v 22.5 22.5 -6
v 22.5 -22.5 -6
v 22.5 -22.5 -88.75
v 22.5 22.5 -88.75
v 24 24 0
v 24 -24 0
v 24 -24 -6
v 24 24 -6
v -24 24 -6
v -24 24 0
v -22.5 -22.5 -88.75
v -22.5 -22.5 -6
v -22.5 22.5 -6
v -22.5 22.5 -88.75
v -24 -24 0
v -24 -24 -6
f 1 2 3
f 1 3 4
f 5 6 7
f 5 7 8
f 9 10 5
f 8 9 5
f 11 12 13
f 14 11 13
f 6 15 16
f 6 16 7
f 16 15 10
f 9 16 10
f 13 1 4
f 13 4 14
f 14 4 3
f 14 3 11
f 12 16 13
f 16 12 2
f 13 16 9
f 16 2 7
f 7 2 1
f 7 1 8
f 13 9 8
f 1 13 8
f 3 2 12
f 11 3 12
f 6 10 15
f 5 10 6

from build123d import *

# Parameters (mm, degrees)
SKETCH1_W           = 48
SKETCH1_H           = 48
BOSS_EXTRUDE1_DEPTH = 6
SKETCH2_W           = 45
SKETCH2_H           = 45
BOSS_EXTRUDE2_DEPTH = 82.75


with BuildPart() as part:
    # Sketch1 → Boss-Extrude1 (new body)
    with BuildSketch(Plane.XY):
        Rectangle(SKETCH1_W, SKETCH1_H)
    extrude(amount=-BOSS_EXTRUDE1_DEPTH)

    # Sketch2 → Boss-Extrude2 (add)
    with BuildSketch(Plane(origin=(0, 0, -6), x_dir=(-1, 0, 0), z_dir=(0, 0, -1))):
        Rectangle(SKETCH2_W, SKETCH2_H)
    extrude(amount=BOSS_EXTRUDE2_DEPTH)


solid = part.part
